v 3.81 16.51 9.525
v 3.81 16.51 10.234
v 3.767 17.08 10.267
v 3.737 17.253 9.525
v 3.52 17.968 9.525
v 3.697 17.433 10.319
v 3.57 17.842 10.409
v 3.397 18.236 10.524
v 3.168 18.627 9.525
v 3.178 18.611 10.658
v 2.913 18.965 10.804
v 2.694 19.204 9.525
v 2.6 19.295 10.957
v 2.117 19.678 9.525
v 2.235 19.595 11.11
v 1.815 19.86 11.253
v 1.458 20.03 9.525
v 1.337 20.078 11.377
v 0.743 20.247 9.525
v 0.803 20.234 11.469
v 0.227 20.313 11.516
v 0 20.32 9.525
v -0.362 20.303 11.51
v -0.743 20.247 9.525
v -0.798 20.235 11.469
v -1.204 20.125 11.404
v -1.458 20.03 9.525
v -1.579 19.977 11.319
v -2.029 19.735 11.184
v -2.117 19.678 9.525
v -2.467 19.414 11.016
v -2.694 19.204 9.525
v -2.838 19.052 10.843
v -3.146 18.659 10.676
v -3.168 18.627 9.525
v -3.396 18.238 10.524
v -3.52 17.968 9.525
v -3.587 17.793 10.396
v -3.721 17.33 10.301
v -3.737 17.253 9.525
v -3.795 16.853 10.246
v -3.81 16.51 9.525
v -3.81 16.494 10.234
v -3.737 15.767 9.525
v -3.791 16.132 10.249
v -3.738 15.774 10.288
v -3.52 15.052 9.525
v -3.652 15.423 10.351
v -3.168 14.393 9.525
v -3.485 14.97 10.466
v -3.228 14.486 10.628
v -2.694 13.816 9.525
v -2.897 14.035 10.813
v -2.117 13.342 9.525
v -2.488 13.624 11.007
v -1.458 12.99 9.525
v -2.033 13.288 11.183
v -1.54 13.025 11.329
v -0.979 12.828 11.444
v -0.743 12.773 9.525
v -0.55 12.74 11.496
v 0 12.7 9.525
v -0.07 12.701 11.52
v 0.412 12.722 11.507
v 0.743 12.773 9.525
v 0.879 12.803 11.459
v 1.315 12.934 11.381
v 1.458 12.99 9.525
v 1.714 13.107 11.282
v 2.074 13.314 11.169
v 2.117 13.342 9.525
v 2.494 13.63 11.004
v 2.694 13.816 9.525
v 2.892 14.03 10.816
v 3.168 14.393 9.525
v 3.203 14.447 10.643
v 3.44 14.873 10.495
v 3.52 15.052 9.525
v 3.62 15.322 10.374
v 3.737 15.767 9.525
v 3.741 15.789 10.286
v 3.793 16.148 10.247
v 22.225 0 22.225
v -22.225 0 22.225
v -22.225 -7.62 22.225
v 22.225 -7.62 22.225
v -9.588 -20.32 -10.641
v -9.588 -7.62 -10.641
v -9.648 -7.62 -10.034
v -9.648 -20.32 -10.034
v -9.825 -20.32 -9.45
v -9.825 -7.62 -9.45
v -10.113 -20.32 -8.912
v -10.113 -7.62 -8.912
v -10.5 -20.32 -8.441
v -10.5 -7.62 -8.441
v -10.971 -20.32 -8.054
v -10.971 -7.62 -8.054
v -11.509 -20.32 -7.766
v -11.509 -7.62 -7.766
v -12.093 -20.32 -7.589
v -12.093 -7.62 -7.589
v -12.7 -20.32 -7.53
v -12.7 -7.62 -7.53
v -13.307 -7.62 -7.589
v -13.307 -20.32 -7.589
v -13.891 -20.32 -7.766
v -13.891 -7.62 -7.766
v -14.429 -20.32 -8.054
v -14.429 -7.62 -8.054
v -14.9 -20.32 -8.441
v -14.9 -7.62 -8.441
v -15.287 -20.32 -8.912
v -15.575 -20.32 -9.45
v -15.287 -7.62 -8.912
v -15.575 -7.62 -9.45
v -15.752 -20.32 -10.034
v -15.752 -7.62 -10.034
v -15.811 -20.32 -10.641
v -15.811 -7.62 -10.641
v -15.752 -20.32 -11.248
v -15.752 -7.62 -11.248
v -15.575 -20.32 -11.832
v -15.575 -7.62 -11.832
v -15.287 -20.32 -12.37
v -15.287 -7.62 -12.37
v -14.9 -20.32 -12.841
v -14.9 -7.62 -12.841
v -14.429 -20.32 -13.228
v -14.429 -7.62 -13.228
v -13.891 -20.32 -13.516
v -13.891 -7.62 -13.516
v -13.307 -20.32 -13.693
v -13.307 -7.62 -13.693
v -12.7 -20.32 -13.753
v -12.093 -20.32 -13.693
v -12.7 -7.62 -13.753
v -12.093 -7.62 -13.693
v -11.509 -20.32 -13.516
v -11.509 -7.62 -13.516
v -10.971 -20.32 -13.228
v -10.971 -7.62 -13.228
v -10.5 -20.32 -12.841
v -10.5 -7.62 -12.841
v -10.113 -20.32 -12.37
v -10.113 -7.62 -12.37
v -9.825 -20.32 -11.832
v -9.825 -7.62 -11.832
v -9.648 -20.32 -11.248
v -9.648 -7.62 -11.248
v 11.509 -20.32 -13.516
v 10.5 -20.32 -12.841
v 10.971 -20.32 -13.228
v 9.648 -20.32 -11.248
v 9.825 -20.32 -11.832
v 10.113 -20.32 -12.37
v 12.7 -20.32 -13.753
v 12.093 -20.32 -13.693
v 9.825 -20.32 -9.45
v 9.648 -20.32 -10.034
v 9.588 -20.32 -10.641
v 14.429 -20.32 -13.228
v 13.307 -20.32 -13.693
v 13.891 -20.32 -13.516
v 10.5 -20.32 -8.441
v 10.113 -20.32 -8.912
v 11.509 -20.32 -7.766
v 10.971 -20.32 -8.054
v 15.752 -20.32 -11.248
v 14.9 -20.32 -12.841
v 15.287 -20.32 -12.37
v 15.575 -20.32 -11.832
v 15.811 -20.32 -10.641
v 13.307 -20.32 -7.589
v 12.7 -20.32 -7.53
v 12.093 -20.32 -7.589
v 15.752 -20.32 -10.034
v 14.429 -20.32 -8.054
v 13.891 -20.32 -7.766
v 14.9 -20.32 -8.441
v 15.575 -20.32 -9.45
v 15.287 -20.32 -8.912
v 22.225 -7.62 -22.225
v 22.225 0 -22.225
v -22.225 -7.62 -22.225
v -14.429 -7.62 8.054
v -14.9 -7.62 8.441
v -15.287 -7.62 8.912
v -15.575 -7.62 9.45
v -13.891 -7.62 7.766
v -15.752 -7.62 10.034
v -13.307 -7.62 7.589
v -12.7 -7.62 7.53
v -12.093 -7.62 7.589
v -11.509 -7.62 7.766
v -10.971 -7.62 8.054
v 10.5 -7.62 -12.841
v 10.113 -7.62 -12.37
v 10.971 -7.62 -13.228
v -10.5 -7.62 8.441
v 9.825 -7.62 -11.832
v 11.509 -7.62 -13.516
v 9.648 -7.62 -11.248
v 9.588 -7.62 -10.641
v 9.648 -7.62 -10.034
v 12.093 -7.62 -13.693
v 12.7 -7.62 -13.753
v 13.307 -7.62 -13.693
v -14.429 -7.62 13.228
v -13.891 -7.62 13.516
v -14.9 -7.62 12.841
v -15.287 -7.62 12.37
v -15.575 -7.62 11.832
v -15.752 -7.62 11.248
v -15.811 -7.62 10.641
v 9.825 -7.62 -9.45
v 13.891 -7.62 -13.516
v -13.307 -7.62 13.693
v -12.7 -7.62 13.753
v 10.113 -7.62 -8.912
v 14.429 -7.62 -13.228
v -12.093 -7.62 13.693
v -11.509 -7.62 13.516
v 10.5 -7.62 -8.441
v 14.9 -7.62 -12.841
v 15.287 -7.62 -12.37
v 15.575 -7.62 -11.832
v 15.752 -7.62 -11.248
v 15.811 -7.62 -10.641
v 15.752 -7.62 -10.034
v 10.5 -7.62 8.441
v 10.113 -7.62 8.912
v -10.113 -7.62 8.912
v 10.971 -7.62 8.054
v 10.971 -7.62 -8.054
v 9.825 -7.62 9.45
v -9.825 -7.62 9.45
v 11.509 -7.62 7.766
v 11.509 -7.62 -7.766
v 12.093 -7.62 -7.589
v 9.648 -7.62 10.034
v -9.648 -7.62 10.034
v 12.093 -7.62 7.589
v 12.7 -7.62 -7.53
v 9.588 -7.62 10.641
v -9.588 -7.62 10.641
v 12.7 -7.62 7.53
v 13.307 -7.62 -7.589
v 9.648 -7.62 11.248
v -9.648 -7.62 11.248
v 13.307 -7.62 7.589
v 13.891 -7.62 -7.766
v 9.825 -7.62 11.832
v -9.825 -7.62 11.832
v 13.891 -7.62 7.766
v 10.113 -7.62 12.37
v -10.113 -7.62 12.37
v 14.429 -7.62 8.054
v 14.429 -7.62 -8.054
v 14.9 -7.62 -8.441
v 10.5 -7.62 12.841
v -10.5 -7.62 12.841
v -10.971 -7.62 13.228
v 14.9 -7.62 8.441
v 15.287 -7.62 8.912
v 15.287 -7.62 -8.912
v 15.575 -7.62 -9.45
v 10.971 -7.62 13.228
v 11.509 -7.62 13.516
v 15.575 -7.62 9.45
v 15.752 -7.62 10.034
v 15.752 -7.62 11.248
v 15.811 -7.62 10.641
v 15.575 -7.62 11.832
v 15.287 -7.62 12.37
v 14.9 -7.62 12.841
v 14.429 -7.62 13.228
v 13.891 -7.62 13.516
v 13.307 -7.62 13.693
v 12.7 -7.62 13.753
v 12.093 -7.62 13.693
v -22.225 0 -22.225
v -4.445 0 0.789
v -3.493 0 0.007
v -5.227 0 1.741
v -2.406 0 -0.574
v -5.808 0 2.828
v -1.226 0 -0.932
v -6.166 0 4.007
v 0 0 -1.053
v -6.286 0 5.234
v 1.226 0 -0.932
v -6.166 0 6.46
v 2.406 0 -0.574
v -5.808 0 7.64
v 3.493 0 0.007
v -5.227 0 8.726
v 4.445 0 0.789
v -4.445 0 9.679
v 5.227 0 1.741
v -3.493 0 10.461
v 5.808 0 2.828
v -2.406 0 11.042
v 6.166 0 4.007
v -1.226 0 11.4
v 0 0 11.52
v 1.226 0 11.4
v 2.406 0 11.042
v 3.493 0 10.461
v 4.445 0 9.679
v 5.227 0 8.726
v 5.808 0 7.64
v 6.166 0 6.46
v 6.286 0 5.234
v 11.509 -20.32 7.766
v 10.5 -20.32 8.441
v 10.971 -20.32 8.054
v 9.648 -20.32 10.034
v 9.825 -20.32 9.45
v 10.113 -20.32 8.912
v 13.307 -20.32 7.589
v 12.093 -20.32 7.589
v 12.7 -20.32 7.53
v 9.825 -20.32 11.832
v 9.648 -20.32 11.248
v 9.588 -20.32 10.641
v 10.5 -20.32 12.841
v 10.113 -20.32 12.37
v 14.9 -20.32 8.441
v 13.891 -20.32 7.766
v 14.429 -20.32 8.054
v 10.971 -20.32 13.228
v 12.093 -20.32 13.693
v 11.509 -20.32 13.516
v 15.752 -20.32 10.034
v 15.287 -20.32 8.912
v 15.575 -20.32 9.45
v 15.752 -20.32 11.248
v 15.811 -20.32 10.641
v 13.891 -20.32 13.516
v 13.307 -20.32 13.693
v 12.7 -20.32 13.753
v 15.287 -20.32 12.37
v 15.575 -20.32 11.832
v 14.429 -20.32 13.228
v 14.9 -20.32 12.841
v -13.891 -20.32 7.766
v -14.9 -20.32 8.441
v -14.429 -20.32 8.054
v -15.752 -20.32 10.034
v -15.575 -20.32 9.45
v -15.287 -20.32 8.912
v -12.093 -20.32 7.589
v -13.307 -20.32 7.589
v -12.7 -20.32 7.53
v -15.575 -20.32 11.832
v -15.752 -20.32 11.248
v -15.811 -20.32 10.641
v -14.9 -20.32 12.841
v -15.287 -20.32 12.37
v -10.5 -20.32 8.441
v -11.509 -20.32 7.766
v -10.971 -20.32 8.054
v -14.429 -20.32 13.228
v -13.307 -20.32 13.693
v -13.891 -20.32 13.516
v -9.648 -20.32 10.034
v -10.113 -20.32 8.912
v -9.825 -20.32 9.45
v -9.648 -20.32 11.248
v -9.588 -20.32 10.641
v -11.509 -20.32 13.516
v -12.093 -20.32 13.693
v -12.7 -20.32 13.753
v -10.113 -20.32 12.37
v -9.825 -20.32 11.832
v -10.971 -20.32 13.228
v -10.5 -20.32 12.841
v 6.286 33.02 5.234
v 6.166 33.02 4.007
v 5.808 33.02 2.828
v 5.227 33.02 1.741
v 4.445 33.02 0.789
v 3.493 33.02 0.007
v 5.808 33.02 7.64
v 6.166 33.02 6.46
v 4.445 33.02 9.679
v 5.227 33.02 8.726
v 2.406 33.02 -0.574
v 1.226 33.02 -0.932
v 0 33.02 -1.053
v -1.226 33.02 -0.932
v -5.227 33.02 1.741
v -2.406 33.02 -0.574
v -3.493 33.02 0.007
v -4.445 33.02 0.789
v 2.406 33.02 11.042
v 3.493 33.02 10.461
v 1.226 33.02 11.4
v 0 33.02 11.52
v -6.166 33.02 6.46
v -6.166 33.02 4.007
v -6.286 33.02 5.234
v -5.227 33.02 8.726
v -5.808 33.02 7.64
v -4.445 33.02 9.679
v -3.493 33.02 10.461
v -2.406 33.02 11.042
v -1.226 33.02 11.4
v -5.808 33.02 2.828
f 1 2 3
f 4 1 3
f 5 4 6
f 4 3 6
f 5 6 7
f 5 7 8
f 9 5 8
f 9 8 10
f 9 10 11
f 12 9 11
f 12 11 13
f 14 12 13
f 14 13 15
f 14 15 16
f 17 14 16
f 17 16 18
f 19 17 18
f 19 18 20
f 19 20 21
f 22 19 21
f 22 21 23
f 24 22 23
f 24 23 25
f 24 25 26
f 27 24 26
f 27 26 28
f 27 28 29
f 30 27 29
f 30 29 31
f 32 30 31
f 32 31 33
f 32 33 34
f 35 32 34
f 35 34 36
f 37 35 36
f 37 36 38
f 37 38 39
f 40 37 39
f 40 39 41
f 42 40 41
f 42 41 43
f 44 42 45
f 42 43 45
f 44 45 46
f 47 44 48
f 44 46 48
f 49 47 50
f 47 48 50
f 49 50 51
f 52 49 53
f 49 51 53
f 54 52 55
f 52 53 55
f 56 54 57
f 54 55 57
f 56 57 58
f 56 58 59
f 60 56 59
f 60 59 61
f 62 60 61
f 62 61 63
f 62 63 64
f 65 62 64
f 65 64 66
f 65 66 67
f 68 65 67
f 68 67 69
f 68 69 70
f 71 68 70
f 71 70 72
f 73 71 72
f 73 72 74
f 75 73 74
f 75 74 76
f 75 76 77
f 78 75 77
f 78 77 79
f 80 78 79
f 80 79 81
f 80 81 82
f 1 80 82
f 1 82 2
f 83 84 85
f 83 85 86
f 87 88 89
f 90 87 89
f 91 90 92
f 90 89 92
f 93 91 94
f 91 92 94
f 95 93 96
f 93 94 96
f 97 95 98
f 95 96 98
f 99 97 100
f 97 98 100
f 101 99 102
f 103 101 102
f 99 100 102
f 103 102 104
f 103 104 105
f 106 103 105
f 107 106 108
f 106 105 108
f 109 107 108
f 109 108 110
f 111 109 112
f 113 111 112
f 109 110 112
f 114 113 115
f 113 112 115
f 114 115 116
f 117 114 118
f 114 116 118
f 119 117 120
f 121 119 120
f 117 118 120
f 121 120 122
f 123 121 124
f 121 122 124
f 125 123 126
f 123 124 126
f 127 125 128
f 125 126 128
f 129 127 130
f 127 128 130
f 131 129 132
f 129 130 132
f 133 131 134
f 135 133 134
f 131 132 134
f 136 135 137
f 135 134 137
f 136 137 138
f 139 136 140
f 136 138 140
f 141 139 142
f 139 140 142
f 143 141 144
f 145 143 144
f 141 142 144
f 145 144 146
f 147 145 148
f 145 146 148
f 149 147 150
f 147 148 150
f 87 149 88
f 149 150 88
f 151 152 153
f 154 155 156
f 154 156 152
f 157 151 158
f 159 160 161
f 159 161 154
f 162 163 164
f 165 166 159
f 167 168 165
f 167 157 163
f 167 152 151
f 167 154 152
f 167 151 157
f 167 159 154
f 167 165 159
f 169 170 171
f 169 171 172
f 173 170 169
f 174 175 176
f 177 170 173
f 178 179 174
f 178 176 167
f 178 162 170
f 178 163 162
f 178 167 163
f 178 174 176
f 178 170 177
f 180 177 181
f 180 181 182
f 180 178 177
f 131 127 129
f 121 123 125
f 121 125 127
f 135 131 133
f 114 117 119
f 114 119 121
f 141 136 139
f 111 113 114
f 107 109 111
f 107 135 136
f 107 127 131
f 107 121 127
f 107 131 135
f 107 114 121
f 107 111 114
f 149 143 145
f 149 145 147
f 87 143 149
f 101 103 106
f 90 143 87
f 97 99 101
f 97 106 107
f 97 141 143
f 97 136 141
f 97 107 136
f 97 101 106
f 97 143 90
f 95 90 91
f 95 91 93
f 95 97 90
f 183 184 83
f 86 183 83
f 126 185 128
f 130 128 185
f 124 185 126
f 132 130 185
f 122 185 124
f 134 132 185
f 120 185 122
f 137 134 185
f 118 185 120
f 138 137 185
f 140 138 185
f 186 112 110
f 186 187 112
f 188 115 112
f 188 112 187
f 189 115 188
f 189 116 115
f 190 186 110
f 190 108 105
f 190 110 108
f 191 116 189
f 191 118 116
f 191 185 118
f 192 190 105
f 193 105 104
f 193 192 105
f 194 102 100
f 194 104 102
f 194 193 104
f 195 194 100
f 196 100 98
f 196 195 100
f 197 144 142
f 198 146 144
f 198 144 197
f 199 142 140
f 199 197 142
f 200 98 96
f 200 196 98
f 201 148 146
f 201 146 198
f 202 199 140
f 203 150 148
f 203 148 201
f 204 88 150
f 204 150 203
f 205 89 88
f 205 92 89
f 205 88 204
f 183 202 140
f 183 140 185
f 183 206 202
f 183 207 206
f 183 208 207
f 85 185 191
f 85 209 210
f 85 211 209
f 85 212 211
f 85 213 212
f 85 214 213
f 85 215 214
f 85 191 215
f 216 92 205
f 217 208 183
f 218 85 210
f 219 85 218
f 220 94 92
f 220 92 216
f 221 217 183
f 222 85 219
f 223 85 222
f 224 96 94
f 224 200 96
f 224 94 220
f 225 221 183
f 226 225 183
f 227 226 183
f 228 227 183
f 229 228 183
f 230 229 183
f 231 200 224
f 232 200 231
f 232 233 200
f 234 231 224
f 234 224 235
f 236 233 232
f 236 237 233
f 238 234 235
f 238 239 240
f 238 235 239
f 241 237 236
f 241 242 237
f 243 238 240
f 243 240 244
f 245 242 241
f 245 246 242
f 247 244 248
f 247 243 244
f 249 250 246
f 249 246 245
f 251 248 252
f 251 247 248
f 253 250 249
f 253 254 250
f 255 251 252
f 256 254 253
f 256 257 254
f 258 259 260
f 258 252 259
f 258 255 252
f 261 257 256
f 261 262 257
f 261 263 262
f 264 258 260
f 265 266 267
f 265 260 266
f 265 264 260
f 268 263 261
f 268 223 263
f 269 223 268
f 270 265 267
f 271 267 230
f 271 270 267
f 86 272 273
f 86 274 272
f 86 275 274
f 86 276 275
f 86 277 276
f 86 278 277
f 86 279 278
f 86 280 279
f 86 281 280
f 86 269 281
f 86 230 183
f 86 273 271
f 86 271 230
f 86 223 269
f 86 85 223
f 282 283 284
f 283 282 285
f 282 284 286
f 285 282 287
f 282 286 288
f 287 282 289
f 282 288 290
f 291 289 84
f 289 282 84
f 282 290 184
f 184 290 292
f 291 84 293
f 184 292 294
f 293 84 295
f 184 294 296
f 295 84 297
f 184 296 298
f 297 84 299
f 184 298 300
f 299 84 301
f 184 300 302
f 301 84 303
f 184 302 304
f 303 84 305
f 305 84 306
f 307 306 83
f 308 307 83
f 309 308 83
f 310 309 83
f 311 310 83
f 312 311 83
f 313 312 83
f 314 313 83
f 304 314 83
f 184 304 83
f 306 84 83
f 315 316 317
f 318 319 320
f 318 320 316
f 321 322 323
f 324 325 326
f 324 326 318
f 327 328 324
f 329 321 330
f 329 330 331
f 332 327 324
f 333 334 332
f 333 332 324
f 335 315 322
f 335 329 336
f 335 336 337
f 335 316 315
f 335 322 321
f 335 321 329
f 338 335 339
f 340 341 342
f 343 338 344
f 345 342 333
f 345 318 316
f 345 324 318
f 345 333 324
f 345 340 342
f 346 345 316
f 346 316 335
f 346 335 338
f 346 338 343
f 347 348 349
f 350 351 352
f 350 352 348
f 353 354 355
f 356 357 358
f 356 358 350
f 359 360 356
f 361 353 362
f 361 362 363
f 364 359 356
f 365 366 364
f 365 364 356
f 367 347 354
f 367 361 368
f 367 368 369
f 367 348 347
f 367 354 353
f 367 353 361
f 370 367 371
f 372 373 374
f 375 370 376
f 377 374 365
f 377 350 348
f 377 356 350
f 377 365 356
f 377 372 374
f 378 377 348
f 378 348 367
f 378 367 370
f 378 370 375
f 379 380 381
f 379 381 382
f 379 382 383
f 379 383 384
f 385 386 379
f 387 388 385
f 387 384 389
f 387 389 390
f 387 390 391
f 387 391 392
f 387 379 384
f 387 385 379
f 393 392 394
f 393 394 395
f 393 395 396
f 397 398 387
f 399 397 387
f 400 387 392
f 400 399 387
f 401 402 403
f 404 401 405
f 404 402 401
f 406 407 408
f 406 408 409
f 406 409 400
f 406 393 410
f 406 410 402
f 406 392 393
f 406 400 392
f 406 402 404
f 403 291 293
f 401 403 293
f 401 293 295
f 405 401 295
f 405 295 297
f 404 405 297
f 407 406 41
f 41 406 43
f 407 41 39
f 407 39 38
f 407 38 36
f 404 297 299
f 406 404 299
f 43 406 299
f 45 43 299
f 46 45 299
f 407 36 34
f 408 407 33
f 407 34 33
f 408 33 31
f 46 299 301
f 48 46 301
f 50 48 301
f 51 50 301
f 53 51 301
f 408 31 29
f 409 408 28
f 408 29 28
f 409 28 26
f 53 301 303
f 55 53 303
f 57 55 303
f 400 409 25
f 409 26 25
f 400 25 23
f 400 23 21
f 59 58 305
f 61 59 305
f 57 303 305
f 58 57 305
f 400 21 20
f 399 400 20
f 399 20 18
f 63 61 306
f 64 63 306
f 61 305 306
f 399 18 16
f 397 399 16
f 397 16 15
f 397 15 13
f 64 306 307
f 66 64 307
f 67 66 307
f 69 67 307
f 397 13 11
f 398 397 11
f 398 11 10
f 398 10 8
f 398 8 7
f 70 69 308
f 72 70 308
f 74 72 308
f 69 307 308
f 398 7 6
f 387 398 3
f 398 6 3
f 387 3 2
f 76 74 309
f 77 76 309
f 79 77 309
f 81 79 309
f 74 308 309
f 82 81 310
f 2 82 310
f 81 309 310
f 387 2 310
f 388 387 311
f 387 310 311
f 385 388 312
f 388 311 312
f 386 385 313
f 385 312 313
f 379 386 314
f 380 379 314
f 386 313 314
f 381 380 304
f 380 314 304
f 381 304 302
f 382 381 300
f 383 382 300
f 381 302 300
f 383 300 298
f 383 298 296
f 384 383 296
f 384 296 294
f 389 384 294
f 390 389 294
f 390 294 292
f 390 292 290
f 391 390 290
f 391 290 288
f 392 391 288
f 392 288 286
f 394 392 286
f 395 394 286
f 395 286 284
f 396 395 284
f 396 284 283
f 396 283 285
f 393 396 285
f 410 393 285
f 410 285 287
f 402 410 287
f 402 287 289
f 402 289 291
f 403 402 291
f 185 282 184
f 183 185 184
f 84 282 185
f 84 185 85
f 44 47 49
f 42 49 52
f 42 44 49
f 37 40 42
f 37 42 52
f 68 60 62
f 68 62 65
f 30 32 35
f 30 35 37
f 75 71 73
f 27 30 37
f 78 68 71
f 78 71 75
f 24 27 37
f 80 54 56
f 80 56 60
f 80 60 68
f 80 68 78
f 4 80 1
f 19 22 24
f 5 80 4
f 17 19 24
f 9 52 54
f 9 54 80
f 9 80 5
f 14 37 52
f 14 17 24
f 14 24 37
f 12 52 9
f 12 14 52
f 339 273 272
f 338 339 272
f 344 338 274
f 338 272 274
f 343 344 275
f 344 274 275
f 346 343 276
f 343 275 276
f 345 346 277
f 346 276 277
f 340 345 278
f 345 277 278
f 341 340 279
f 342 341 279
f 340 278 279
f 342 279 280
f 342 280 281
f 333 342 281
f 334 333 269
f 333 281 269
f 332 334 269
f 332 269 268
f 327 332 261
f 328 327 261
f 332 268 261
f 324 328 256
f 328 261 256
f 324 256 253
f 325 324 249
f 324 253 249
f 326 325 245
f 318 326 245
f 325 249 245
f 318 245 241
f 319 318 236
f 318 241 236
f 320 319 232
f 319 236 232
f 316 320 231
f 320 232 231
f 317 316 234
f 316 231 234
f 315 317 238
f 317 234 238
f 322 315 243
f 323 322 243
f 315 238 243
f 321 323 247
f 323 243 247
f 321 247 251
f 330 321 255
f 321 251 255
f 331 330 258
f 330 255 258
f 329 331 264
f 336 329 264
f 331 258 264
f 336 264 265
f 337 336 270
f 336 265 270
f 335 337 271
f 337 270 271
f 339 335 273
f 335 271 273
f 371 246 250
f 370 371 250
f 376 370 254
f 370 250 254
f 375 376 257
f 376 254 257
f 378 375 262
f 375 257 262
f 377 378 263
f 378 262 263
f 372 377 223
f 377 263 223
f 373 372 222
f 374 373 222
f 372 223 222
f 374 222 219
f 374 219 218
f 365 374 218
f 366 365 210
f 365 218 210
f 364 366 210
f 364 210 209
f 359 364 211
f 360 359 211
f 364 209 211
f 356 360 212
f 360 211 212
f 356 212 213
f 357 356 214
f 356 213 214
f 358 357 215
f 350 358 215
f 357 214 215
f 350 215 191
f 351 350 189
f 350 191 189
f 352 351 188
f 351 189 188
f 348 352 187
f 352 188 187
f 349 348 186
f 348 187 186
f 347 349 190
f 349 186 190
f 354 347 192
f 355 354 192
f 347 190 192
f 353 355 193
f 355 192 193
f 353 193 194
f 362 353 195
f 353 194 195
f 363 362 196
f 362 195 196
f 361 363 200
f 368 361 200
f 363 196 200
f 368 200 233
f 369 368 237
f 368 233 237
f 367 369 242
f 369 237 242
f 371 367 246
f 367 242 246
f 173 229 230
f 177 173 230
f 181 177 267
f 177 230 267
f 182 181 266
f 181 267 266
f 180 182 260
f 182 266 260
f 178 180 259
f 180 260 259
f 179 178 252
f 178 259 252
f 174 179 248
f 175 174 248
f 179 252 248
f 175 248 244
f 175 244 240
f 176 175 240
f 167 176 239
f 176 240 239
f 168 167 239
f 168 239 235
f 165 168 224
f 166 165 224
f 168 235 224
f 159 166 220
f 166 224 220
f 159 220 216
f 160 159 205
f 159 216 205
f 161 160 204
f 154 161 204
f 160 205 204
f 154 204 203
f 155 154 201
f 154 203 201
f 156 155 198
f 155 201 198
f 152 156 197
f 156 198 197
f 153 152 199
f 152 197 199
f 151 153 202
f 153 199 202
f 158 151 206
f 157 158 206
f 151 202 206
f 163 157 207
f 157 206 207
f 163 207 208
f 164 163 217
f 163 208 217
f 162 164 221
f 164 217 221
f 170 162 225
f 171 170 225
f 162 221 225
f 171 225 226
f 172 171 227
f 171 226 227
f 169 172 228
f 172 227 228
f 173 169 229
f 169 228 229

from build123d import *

# Parameters (mm, degrees)
F0_W     = 44.45
F0_H     = 44.45
F1_DEPTH = 7.62
F2_R     = 3.1115
F3_DEPTH = 12.7
F4_R     = 6.2865
F5_DEPTH = 33.02
F6_R     = 3.81
F7_DEPTH = 12.7


with BuildPart() as f1:
    # F0 (on Front) → F1 (new body)
    with BuildSketch(Plane.XZ):
        Rectangle(F0_W, F0_H)
    extrude(amount=F1_DEPTH)

    # F2 (on face) → F3 (join)
    with BuildSketch(Plane.XZ.offset(7.62)):
        with Locations((-12.7, 10.641133)):
            Circle(F2_R)
        with Locations((12.7, 10.641133)):
            Circle(F2_R)
        with Locations((12.7, -10.641133)):
            Circle(F2_R)
        with Locations((-12.7, -10.641133)):
            Circle(F2_R)
    extrude(amount=F3_DEPTH)

    # F4 (on face) → F5 (join)
    with BuildSketch(Plane(origin=(0, 0, 0), x_dir=(-1, 0, 0), z_dir=(0, 1, 0))):
        with Locations((0, 5.233867)):
            Circle(F4_R)
    extrude(amount=F5_DEPTH)

    # F6 (on face) → F7 (cut)
    with BuildSketch(Plane.XY.offset(22.225)):
        with Locations((0, 16.51)):
            Circle(F6_R)
    extrude(amount=-F7_DEPTH, mode=Mode.SUBTRACT)


solid = f1.part
